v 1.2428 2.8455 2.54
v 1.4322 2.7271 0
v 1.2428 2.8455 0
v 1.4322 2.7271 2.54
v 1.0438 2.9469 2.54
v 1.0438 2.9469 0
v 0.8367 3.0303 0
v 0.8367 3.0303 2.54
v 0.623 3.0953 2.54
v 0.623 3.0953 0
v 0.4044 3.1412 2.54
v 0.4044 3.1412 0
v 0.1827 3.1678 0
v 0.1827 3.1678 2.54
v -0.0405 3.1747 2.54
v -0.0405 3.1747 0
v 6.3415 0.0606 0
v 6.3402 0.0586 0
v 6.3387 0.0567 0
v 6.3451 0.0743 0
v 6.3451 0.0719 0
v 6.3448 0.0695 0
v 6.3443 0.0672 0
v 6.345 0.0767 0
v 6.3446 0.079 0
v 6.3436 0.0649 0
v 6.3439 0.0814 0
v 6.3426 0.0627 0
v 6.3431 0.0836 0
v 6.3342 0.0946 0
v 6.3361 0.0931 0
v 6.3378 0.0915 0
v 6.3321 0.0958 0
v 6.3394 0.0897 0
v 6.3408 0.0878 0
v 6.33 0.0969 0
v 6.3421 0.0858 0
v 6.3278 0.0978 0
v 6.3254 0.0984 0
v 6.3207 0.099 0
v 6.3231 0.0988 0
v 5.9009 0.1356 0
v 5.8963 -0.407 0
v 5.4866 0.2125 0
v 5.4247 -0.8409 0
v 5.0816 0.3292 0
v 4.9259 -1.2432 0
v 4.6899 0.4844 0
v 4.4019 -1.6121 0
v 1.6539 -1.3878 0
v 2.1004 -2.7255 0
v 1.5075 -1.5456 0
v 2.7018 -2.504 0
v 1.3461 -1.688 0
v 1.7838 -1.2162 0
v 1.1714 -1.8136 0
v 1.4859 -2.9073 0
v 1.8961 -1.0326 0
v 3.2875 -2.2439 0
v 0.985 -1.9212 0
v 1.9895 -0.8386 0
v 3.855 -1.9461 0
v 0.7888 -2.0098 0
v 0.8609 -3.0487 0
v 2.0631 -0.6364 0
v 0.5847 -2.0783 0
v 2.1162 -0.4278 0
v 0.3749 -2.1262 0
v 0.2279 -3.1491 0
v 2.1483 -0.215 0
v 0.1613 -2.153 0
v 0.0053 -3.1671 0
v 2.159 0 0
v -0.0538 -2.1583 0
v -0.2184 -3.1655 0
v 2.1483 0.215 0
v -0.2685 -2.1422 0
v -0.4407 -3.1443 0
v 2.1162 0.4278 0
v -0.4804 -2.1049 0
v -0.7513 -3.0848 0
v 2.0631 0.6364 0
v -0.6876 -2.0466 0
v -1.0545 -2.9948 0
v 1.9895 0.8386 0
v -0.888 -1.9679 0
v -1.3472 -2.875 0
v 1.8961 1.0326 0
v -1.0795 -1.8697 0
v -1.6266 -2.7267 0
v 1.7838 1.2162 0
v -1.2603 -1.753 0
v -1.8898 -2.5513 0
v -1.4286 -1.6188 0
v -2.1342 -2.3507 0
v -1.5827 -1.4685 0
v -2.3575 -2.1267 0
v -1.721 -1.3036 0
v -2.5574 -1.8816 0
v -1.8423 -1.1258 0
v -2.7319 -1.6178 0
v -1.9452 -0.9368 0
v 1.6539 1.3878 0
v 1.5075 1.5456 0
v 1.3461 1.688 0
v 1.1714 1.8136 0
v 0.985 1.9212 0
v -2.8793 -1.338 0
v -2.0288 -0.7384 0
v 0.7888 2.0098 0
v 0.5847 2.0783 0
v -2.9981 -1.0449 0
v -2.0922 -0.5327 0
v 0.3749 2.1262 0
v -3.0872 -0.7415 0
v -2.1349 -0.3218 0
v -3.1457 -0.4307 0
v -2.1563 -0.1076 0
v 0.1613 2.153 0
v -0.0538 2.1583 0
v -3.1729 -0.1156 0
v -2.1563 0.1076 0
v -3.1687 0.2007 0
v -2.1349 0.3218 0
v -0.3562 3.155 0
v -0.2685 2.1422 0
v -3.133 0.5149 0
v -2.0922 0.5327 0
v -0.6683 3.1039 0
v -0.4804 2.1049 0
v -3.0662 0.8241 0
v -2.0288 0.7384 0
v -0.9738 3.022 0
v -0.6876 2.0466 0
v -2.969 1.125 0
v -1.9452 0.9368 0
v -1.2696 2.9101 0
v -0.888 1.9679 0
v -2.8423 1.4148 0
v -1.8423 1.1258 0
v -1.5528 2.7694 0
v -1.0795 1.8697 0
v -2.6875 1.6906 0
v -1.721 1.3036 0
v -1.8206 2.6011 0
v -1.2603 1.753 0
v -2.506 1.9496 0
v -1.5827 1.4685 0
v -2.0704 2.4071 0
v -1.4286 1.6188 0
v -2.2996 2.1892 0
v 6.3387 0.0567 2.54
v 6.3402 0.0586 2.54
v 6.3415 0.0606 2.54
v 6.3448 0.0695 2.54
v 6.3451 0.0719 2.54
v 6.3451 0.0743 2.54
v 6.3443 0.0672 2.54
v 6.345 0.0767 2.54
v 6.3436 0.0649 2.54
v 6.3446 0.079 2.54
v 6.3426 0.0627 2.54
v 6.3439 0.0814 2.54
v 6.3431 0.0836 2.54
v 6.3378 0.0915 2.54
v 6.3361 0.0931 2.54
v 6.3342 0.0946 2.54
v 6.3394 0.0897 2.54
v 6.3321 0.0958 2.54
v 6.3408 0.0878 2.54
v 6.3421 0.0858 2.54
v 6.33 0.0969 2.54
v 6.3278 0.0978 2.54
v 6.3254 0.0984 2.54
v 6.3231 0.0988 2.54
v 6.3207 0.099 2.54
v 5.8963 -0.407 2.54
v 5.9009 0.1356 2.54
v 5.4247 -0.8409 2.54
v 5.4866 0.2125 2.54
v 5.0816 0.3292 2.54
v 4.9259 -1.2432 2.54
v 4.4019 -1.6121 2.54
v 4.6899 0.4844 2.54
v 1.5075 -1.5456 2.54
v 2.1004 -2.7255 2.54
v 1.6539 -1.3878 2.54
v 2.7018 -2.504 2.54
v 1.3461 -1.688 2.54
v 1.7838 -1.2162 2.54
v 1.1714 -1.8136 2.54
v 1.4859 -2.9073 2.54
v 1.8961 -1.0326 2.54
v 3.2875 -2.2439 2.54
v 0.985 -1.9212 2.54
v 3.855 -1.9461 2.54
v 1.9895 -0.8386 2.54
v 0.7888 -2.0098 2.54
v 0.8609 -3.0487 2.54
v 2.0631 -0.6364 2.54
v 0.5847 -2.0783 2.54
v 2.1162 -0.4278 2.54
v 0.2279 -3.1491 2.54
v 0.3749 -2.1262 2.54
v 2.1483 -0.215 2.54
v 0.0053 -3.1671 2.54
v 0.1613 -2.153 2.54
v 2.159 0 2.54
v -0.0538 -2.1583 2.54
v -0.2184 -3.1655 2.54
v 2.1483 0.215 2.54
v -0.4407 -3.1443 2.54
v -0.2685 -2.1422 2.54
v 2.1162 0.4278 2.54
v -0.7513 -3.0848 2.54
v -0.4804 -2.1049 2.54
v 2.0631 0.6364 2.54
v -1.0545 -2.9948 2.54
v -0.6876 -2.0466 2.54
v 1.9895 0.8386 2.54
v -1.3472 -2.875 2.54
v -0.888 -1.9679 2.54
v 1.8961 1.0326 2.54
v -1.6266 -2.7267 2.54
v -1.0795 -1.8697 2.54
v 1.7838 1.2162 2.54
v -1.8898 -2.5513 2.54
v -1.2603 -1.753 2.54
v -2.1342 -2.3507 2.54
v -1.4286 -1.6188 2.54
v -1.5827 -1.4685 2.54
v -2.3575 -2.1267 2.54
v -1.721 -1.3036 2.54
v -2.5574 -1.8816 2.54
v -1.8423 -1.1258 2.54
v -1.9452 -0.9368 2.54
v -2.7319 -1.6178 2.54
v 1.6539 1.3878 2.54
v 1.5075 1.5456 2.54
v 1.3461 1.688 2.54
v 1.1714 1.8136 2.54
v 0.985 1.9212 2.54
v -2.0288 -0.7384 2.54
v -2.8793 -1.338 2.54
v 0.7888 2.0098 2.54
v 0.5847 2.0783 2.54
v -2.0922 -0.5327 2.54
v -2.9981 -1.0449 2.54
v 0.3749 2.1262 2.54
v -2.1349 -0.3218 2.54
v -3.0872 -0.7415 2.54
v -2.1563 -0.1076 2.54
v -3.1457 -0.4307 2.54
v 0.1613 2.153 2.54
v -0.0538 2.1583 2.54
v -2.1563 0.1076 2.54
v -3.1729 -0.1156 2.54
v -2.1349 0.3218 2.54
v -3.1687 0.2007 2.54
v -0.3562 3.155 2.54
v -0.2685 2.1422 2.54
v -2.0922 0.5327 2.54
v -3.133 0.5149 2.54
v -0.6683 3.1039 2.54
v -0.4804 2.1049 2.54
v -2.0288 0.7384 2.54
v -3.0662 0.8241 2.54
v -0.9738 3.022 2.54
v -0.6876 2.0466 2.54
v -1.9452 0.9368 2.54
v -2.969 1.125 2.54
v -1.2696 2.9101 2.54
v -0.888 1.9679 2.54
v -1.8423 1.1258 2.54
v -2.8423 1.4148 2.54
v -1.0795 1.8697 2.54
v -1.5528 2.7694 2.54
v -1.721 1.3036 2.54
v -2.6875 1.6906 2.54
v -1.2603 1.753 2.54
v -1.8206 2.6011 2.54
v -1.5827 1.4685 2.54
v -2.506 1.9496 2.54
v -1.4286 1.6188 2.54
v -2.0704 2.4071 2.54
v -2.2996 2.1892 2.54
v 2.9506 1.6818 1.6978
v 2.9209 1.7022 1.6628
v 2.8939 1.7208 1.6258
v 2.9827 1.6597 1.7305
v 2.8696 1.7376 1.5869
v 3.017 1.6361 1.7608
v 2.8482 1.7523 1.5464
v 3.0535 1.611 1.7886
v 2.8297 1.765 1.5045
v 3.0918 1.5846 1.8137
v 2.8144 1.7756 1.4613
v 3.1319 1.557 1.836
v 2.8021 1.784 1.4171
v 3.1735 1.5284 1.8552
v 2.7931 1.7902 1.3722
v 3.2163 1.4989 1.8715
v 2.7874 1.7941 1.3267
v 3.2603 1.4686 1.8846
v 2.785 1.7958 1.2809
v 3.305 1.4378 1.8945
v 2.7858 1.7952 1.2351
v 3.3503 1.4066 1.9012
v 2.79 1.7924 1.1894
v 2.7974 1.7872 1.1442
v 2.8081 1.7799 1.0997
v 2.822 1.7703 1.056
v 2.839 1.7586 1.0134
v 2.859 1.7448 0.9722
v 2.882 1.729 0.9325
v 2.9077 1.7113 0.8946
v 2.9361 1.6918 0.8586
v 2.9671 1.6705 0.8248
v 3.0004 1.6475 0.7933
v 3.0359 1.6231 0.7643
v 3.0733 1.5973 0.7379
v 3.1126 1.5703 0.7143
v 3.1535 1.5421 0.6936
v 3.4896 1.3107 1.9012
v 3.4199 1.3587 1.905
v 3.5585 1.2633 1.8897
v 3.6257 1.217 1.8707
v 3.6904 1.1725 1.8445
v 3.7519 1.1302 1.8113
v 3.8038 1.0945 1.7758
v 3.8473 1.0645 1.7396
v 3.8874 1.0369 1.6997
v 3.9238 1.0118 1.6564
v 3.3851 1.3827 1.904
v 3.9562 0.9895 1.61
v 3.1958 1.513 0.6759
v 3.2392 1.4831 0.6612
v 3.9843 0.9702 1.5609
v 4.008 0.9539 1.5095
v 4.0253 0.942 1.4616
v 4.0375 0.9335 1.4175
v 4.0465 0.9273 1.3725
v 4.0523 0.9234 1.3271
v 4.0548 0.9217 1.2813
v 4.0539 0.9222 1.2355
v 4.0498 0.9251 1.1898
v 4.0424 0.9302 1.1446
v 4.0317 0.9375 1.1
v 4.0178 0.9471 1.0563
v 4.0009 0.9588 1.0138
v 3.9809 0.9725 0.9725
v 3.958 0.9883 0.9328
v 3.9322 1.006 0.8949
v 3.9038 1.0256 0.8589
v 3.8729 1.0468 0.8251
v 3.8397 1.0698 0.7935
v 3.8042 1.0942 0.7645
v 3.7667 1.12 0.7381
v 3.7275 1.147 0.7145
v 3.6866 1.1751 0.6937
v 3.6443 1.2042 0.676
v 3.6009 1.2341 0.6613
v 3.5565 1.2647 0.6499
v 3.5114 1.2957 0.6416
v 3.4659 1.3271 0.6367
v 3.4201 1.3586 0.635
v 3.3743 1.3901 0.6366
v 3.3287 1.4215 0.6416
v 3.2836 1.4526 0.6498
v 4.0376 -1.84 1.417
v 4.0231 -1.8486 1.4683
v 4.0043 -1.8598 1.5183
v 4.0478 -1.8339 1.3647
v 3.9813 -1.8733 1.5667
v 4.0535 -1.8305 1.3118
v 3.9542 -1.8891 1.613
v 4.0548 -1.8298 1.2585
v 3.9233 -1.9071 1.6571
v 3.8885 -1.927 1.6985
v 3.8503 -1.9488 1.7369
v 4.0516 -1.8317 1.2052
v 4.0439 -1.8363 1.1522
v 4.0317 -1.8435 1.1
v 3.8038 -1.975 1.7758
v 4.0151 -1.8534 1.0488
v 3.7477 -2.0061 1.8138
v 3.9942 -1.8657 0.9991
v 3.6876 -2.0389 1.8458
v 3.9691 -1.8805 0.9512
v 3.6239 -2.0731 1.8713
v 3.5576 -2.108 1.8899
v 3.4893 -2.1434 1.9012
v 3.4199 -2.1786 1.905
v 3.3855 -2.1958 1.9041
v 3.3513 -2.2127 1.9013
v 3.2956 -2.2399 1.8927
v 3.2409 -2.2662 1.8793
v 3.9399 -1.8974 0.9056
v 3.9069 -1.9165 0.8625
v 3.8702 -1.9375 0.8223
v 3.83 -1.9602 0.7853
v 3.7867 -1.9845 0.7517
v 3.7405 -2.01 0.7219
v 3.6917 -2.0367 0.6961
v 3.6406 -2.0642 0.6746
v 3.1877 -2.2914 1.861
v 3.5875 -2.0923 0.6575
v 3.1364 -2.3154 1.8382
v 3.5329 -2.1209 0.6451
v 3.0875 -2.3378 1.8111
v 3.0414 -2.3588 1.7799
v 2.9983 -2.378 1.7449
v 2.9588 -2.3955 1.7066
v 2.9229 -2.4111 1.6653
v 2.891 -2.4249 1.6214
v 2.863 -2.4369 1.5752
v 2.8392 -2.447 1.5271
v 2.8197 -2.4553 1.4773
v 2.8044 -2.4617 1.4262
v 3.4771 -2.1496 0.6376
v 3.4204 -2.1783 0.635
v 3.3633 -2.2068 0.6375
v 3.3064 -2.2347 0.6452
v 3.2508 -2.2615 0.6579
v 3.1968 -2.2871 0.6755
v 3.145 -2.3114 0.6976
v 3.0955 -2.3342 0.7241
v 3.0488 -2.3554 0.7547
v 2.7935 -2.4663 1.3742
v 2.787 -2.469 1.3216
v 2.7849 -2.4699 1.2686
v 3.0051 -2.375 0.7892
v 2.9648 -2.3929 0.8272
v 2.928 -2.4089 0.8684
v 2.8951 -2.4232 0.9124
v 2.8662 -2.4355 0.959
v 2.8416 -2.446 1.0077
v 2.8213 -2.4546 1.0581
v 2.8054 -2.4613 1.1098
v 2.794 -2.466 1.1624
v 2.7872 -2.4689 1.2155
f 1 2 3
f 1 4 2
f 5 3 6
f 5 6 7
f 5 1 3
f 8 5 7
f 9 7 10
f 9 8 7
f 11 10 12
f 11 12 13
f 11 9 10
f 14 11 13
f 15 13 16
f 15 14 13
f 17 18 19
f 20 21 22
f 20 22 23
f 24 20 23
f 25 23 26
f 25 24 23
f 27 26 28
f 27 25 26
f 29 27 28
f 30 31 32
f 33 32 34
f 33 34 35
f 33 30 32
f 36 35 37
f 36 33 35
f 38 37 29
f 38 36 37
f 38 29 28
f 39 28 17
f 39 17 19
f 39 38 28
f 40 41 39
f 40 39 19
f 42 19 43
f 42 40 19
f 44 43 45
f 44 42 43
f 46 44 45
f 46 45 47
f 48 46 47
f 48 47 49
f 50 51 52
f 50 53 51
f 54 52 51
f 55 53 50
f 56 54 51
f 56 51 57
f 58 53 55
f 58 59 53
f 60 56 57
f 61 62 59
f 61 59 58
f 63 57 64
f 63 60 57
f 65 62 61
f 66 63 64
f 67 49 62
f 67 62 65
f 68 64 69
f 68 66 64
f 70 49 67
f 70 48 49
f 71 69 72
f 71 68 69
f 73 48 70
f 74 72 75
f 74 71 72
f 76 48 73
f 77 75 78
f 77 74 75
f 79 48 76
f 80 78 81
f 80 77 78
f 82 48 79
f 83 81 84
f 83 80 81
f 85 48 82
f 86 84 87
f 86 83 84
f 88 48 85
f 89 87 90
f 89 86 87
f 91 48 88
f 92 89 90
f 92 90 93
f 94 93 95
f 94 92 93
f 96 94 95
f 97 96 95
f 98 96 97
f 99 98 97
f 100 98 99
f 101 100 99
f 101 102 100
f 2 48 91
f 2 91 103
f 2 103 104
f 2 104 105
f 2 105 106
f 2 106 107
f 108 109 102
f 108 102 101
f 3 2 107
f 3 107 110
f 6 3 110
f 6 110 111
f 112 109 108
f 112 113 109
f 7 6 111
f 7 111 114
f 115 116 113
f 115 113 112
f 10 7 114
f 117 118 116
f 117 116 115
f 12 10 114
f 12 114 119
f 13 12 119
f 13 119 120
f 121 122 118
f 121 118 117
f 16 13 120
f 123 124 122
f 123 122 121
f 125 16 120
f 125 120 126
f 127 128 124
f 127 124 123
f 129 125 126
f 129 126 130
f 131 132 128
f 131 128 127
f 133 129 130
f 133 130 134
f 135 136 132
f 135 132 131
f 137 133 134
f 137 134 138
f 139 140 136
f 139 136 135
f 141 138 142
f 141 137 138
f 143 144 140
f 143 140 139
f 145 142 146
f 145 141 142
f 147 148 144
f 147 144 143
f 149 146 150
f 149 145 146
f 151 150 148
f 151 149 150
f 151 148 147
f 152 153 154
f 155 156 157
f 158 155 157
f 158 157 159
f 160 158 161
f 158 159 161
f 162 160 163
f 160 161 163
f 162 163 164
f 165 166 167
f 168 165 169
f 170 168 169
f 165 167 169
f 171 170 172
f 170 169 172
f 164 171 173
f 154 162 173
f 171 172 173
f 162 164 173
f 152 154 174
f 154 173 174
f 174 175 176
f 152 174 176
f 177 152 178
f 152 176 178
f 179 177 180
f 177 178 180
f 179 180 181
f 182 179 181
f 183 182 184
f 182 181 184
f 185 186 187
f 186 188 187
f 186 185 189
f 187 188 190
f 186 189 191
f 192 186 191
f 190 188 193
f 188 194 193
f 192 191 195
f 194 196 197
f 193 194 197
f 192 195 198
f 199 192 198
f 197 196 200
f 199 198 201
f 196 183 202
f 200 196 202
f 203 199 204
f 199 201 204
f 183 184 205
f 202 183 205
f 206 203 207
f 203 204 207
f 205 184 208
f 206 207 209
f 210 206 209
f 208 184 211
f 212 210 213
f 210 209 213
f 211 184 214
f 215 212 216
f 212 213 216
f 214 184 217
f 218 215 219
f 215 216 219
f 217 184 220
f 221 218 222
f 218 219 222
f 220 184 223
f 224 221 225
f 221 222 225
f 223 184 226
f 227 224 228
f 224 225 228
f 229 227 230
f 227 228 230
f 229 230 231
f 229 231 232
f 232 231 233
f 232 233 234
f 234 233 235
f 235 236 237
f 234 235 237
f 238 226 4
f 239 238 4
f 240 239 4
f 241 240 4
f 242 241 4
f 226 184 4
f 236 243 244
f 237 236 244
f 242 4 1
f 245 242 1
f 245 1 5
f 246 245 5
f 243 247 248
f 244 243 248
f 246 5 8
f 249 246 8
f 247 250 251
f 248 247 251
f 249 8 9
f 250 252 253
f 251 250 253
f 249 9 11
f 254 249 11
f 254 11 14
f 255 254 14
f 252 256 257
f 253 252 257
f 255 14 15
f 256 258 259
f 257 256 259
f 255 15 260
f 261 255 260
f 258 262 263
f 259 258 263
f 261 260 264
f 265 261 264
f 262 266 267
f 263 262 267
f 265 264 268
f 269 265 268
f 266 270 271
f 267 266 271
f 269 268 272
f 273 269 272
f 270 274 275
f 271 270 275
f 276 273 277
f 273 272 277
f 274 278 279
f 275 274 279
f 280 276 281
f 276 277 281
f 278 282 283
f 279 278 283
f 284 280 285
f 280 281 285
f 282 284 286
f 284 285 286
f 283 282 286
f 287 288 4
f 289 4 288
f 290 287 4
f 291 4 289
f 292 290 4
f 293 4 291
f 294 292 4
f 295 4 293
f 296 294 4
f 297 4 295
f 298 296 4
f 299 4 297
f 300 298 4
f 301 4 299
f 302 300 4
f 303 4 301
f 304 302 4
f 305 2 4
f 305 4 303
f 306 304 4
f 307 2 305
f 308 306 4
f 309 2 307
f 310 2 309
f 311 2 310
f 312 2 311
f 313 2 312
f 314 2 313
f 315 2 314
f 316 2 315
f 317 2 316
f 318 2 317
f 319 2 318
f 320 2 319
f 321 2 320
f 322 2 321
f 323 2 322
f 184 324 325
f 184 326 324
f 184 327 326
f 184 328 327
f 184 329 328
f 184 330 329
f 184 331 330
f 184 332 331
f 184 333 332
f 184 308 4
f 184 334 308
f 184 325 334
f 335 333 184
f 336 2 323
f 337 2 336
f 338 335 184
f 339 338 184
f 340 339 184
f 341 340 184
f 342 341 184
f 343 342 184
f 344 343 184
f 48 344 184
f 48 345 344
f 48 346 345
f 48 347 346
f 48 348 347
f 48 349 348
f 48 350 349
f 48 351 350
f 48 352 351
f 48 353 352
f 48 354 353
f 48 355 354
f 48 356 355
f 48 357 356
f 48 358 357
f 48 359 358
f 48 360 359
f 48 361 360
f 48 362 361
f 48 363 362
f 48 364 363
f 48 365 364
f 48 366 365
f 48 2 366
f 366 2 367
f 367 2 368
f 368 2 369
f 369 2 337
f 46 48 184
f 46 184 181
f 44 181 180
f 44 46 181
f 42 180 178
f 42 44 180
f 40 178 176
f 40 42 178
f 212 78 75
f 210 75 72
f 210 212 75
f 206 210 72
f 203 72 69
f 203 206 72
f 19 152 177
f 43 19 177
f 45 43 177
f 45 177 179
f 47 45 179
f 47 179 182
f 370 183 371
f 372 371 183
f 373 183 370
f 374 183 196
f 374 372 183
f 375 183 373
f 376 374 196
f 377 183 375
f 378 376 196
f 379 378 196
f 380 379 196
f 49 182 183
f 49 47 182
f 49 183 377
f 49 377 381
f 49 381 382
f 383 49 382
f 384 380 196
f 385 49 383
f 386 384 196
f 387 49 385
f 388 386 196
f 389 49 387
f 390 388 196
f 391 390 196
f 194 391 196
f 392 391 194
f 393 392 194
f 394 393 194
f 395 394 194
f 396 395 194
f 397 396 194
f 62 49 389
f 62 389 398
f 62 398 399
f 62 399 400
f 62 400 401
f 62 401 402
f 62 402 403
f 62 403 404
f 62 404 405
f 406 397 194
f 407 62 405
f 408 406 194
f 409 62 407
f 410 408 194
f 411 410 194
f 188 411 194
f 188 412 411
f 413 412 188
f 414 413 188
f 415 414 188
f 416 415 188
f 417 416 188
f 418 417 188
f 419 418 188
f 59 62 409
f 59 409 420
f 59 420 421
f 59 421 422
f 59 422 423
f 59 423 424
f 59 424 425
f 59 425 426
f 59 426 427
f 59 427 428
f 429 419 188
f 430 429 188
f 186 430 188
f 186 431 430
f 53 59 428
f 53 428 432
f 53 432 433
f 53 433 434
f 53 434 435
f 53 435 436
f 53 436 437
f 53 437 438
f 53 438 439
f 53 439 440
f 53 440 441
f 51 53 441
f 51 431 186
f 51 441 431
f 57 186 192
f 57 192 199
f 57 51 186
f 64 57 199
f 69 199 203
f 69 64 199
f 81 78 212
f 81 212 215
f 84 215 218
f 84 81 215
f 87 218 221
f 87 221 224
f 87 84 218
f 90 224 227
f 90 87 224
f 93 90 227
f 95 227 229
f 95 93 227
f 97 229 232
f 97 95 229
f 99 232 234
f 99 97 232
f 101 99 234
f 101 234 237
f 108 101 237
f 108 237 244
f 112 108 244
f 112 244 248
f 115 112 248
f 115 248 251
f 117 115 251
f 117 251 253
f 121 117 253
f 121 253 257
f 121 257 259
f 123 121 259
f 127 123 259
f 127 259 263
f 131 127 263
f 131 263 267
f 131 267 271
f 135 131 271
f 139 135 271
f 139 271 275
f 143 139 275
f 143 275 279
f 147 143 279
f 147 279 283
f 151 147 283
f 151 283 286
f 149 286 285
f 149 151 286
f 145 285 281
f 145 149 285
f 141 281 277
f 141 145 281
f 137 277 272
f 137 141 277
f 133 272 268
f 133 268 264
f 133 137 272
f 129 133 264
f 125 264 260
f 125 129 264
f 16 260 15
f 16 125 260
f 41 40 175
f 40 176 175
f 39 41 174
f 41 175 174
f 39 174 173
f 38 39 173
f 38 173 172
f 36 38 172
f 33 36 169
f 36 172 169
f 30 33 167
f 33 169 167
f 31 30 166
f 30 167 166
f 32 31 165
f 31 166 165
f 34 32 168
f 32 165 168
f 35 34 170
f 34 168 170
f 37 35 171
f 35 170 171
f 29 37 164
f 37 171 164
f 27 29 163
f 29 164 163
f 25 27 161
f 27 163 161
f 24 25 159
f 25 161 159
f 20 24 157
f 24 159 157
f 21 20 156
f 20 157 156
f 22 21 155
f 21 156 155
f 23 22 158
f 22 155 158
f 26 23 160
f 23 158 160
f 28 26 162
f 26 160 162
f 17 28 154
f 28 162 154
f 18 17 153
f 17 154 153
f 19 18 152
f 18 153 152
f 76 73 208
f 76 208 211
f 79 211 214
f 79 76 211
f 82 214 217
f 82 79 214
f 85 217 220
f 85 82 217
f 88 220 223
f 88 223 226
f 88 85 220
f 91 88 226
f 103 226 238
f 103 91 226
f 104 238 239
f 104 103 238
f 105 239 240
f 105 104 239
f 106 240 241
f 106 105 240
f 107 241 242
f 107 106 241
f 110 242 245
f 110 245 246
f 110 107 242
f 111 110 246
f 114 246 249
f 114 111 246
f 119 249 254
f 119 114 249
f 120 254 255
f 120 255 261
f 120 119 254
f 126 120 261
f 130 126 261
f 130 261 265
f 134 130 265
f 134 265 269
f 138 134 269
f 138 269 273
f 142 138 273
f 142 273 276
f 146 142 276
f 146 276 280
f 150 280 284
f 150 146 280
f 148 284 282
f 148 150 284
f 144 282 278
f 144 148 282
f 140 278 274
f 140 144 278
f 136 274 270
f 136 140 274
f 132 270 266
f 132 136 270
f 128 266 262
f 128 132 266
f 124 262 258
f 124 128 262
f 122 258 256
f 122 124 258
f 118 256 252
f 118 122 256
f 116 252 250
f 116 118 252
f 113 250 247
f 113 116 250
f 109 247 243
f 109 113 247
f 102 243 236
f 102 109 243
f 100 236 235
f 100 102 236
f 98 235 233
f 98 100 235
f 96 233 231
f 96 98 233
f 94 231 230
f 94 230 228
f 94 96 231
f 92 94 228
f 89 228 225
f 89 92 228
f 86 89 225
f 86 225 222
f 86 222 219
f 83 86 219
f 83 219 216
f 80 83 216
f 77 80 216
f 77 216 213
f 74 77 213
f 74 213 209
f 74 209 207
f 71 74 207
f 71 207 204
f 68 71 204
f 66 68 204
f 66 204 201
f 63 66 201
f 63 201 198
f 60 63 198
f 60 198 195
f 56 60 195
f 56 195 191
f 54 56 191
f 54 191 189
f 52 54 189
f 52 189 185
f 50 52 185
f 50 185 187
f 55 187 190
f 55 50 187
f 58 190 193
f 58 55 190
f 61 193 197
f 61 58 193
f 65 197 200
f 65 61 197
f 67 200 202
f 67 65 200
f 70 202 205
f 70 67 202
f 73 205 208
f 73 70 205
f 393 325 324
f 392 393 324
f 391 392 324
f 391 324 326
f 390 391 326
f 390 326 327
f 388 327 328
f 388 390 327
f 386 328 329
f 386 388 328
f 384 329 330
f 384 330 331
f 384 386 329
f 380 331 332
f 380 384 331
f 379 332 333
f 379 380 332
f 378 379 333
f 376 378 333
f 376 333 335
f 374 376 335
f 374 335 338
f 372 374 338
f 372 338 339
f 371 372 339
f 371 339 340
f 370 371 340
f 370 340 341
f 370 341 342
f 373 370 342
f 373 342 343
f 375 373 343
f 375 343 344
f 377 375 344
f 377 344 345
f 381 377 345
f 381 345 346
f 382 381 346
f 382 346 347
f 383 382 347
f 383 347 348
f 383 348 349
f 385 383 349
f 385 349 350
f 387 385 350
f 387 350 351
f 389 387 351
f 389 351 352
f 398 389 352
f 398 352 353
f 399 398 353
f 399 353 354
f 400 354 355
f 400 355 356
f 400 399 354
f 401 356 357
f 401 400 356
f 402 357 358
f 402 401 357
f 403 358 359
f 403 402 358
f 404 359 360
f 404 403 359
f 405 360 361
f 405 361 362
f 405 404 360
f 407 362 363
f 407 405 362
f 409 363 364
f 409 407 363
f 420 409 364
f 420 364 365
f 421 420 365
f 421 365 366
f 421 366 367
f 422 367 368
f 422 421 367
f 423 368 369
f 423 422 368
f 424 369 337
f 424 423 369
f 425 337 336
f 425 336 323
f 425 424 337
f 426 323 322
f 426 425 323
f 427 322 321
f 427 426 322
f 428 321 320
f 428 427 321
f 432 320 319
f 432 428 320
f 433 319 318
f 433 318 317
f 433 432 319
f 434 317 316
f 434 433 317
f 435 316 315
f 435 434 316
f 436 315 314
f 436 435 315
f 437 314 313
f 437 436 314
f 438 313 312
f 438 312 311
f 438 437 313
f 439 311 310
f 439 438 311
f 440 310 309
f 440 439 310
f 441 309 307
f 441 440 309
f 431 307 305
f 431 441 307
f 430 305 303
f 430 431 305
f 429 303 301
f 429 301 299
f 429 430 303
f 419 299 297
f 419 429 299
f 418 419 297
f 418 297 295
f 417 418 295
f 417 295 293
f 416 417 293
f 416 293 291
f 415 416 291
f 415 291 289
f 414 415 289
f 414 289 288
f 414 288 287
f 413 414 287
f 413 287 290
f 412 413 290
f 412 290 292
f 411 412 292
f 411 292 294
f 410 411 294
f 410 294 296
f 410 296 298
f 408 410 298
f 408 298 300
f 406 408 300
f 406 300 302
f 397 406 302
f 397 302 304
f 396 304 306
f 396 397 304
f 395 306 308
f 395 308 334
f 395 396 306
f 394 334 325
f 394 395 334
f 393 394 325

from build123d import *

# Parameters (mm, degrees)
SKETCH1_R               = 2.159
BOSS_EXTRUDE1_DEPTH     = 2.54
FILLET2_R               = 2.54
FILLET3_R               = 0.0254
CUT_EXTRUDE1_DEPTH      = 8.536089729
CUT_EXTRUDE1_DEPTH_BACK = 8.536089729
SKETCH6_R               = 0.635


with BuildPart() as part:
    # Sketch1 → Boss-Extrude1 (new body)
    with BuildSketch(Plane.XY):
        with BuildLine():
            Line((1.03203613, 3.002586623), (4.689867375, 0.484445873))
            ThreePointArc((4.689867375, 0.484445873), (5.512880678, 0.206373406), (6.374728135, 0.097313081))
            ThreePointArc((6.374728135, 0.097313081), (3.49593357, -2.139961579), (0, -3.175))
            ThreePointArc((0, -3.175), (-3.131600033, 0.523169415), (1.03203613, 3.002586623))
        make_face()
        Circle(SKETCH1_R, mode=Mode.SUBTRACT)
    extrude(amount=BOSS_EXTRUDE1_DEPTH)

    # Fillet2
    fillet2_edges = [part.edges().sort_by_distance(p)[0] for p in [
        (1.03203613, 3.002586623, 1.27),
        (0, -3.175, 1.27),
    ]]
    fillet(fillet2_edges, radius=FILLET2_R)

    # Fillet3
    fillet3_edges = [part.edges().sort_by_distance(p)[0] for p in [
        (6.374728135, 0.097313081, 1.27),
    ]]
    fillet(fillet3_edges, radius=FILLET3_R)

    # Sketch6 → Cut-Extrude1 (cut, two sides: drawn at the far end of the back side and taken through both)
    with BuildSketch(Plane(origin=(0, 0, 0), x_dir=(1, 0, 0), z_dir=(0, 1, 0)).offset(-CUT_EXTRUDE1_DEPTH_BACK)):
        with Locations(Location((3.419867375, -1.27, 0), (0, 0, 270))):
            Circle(SKETCH6_R)
    extrude(amount=CUT_EXTRUDE1_DEPTH + CUT_EXTRUDE1_DEPTH_BACK, mode=Mode.SUBTRACT)


solid = part.part
